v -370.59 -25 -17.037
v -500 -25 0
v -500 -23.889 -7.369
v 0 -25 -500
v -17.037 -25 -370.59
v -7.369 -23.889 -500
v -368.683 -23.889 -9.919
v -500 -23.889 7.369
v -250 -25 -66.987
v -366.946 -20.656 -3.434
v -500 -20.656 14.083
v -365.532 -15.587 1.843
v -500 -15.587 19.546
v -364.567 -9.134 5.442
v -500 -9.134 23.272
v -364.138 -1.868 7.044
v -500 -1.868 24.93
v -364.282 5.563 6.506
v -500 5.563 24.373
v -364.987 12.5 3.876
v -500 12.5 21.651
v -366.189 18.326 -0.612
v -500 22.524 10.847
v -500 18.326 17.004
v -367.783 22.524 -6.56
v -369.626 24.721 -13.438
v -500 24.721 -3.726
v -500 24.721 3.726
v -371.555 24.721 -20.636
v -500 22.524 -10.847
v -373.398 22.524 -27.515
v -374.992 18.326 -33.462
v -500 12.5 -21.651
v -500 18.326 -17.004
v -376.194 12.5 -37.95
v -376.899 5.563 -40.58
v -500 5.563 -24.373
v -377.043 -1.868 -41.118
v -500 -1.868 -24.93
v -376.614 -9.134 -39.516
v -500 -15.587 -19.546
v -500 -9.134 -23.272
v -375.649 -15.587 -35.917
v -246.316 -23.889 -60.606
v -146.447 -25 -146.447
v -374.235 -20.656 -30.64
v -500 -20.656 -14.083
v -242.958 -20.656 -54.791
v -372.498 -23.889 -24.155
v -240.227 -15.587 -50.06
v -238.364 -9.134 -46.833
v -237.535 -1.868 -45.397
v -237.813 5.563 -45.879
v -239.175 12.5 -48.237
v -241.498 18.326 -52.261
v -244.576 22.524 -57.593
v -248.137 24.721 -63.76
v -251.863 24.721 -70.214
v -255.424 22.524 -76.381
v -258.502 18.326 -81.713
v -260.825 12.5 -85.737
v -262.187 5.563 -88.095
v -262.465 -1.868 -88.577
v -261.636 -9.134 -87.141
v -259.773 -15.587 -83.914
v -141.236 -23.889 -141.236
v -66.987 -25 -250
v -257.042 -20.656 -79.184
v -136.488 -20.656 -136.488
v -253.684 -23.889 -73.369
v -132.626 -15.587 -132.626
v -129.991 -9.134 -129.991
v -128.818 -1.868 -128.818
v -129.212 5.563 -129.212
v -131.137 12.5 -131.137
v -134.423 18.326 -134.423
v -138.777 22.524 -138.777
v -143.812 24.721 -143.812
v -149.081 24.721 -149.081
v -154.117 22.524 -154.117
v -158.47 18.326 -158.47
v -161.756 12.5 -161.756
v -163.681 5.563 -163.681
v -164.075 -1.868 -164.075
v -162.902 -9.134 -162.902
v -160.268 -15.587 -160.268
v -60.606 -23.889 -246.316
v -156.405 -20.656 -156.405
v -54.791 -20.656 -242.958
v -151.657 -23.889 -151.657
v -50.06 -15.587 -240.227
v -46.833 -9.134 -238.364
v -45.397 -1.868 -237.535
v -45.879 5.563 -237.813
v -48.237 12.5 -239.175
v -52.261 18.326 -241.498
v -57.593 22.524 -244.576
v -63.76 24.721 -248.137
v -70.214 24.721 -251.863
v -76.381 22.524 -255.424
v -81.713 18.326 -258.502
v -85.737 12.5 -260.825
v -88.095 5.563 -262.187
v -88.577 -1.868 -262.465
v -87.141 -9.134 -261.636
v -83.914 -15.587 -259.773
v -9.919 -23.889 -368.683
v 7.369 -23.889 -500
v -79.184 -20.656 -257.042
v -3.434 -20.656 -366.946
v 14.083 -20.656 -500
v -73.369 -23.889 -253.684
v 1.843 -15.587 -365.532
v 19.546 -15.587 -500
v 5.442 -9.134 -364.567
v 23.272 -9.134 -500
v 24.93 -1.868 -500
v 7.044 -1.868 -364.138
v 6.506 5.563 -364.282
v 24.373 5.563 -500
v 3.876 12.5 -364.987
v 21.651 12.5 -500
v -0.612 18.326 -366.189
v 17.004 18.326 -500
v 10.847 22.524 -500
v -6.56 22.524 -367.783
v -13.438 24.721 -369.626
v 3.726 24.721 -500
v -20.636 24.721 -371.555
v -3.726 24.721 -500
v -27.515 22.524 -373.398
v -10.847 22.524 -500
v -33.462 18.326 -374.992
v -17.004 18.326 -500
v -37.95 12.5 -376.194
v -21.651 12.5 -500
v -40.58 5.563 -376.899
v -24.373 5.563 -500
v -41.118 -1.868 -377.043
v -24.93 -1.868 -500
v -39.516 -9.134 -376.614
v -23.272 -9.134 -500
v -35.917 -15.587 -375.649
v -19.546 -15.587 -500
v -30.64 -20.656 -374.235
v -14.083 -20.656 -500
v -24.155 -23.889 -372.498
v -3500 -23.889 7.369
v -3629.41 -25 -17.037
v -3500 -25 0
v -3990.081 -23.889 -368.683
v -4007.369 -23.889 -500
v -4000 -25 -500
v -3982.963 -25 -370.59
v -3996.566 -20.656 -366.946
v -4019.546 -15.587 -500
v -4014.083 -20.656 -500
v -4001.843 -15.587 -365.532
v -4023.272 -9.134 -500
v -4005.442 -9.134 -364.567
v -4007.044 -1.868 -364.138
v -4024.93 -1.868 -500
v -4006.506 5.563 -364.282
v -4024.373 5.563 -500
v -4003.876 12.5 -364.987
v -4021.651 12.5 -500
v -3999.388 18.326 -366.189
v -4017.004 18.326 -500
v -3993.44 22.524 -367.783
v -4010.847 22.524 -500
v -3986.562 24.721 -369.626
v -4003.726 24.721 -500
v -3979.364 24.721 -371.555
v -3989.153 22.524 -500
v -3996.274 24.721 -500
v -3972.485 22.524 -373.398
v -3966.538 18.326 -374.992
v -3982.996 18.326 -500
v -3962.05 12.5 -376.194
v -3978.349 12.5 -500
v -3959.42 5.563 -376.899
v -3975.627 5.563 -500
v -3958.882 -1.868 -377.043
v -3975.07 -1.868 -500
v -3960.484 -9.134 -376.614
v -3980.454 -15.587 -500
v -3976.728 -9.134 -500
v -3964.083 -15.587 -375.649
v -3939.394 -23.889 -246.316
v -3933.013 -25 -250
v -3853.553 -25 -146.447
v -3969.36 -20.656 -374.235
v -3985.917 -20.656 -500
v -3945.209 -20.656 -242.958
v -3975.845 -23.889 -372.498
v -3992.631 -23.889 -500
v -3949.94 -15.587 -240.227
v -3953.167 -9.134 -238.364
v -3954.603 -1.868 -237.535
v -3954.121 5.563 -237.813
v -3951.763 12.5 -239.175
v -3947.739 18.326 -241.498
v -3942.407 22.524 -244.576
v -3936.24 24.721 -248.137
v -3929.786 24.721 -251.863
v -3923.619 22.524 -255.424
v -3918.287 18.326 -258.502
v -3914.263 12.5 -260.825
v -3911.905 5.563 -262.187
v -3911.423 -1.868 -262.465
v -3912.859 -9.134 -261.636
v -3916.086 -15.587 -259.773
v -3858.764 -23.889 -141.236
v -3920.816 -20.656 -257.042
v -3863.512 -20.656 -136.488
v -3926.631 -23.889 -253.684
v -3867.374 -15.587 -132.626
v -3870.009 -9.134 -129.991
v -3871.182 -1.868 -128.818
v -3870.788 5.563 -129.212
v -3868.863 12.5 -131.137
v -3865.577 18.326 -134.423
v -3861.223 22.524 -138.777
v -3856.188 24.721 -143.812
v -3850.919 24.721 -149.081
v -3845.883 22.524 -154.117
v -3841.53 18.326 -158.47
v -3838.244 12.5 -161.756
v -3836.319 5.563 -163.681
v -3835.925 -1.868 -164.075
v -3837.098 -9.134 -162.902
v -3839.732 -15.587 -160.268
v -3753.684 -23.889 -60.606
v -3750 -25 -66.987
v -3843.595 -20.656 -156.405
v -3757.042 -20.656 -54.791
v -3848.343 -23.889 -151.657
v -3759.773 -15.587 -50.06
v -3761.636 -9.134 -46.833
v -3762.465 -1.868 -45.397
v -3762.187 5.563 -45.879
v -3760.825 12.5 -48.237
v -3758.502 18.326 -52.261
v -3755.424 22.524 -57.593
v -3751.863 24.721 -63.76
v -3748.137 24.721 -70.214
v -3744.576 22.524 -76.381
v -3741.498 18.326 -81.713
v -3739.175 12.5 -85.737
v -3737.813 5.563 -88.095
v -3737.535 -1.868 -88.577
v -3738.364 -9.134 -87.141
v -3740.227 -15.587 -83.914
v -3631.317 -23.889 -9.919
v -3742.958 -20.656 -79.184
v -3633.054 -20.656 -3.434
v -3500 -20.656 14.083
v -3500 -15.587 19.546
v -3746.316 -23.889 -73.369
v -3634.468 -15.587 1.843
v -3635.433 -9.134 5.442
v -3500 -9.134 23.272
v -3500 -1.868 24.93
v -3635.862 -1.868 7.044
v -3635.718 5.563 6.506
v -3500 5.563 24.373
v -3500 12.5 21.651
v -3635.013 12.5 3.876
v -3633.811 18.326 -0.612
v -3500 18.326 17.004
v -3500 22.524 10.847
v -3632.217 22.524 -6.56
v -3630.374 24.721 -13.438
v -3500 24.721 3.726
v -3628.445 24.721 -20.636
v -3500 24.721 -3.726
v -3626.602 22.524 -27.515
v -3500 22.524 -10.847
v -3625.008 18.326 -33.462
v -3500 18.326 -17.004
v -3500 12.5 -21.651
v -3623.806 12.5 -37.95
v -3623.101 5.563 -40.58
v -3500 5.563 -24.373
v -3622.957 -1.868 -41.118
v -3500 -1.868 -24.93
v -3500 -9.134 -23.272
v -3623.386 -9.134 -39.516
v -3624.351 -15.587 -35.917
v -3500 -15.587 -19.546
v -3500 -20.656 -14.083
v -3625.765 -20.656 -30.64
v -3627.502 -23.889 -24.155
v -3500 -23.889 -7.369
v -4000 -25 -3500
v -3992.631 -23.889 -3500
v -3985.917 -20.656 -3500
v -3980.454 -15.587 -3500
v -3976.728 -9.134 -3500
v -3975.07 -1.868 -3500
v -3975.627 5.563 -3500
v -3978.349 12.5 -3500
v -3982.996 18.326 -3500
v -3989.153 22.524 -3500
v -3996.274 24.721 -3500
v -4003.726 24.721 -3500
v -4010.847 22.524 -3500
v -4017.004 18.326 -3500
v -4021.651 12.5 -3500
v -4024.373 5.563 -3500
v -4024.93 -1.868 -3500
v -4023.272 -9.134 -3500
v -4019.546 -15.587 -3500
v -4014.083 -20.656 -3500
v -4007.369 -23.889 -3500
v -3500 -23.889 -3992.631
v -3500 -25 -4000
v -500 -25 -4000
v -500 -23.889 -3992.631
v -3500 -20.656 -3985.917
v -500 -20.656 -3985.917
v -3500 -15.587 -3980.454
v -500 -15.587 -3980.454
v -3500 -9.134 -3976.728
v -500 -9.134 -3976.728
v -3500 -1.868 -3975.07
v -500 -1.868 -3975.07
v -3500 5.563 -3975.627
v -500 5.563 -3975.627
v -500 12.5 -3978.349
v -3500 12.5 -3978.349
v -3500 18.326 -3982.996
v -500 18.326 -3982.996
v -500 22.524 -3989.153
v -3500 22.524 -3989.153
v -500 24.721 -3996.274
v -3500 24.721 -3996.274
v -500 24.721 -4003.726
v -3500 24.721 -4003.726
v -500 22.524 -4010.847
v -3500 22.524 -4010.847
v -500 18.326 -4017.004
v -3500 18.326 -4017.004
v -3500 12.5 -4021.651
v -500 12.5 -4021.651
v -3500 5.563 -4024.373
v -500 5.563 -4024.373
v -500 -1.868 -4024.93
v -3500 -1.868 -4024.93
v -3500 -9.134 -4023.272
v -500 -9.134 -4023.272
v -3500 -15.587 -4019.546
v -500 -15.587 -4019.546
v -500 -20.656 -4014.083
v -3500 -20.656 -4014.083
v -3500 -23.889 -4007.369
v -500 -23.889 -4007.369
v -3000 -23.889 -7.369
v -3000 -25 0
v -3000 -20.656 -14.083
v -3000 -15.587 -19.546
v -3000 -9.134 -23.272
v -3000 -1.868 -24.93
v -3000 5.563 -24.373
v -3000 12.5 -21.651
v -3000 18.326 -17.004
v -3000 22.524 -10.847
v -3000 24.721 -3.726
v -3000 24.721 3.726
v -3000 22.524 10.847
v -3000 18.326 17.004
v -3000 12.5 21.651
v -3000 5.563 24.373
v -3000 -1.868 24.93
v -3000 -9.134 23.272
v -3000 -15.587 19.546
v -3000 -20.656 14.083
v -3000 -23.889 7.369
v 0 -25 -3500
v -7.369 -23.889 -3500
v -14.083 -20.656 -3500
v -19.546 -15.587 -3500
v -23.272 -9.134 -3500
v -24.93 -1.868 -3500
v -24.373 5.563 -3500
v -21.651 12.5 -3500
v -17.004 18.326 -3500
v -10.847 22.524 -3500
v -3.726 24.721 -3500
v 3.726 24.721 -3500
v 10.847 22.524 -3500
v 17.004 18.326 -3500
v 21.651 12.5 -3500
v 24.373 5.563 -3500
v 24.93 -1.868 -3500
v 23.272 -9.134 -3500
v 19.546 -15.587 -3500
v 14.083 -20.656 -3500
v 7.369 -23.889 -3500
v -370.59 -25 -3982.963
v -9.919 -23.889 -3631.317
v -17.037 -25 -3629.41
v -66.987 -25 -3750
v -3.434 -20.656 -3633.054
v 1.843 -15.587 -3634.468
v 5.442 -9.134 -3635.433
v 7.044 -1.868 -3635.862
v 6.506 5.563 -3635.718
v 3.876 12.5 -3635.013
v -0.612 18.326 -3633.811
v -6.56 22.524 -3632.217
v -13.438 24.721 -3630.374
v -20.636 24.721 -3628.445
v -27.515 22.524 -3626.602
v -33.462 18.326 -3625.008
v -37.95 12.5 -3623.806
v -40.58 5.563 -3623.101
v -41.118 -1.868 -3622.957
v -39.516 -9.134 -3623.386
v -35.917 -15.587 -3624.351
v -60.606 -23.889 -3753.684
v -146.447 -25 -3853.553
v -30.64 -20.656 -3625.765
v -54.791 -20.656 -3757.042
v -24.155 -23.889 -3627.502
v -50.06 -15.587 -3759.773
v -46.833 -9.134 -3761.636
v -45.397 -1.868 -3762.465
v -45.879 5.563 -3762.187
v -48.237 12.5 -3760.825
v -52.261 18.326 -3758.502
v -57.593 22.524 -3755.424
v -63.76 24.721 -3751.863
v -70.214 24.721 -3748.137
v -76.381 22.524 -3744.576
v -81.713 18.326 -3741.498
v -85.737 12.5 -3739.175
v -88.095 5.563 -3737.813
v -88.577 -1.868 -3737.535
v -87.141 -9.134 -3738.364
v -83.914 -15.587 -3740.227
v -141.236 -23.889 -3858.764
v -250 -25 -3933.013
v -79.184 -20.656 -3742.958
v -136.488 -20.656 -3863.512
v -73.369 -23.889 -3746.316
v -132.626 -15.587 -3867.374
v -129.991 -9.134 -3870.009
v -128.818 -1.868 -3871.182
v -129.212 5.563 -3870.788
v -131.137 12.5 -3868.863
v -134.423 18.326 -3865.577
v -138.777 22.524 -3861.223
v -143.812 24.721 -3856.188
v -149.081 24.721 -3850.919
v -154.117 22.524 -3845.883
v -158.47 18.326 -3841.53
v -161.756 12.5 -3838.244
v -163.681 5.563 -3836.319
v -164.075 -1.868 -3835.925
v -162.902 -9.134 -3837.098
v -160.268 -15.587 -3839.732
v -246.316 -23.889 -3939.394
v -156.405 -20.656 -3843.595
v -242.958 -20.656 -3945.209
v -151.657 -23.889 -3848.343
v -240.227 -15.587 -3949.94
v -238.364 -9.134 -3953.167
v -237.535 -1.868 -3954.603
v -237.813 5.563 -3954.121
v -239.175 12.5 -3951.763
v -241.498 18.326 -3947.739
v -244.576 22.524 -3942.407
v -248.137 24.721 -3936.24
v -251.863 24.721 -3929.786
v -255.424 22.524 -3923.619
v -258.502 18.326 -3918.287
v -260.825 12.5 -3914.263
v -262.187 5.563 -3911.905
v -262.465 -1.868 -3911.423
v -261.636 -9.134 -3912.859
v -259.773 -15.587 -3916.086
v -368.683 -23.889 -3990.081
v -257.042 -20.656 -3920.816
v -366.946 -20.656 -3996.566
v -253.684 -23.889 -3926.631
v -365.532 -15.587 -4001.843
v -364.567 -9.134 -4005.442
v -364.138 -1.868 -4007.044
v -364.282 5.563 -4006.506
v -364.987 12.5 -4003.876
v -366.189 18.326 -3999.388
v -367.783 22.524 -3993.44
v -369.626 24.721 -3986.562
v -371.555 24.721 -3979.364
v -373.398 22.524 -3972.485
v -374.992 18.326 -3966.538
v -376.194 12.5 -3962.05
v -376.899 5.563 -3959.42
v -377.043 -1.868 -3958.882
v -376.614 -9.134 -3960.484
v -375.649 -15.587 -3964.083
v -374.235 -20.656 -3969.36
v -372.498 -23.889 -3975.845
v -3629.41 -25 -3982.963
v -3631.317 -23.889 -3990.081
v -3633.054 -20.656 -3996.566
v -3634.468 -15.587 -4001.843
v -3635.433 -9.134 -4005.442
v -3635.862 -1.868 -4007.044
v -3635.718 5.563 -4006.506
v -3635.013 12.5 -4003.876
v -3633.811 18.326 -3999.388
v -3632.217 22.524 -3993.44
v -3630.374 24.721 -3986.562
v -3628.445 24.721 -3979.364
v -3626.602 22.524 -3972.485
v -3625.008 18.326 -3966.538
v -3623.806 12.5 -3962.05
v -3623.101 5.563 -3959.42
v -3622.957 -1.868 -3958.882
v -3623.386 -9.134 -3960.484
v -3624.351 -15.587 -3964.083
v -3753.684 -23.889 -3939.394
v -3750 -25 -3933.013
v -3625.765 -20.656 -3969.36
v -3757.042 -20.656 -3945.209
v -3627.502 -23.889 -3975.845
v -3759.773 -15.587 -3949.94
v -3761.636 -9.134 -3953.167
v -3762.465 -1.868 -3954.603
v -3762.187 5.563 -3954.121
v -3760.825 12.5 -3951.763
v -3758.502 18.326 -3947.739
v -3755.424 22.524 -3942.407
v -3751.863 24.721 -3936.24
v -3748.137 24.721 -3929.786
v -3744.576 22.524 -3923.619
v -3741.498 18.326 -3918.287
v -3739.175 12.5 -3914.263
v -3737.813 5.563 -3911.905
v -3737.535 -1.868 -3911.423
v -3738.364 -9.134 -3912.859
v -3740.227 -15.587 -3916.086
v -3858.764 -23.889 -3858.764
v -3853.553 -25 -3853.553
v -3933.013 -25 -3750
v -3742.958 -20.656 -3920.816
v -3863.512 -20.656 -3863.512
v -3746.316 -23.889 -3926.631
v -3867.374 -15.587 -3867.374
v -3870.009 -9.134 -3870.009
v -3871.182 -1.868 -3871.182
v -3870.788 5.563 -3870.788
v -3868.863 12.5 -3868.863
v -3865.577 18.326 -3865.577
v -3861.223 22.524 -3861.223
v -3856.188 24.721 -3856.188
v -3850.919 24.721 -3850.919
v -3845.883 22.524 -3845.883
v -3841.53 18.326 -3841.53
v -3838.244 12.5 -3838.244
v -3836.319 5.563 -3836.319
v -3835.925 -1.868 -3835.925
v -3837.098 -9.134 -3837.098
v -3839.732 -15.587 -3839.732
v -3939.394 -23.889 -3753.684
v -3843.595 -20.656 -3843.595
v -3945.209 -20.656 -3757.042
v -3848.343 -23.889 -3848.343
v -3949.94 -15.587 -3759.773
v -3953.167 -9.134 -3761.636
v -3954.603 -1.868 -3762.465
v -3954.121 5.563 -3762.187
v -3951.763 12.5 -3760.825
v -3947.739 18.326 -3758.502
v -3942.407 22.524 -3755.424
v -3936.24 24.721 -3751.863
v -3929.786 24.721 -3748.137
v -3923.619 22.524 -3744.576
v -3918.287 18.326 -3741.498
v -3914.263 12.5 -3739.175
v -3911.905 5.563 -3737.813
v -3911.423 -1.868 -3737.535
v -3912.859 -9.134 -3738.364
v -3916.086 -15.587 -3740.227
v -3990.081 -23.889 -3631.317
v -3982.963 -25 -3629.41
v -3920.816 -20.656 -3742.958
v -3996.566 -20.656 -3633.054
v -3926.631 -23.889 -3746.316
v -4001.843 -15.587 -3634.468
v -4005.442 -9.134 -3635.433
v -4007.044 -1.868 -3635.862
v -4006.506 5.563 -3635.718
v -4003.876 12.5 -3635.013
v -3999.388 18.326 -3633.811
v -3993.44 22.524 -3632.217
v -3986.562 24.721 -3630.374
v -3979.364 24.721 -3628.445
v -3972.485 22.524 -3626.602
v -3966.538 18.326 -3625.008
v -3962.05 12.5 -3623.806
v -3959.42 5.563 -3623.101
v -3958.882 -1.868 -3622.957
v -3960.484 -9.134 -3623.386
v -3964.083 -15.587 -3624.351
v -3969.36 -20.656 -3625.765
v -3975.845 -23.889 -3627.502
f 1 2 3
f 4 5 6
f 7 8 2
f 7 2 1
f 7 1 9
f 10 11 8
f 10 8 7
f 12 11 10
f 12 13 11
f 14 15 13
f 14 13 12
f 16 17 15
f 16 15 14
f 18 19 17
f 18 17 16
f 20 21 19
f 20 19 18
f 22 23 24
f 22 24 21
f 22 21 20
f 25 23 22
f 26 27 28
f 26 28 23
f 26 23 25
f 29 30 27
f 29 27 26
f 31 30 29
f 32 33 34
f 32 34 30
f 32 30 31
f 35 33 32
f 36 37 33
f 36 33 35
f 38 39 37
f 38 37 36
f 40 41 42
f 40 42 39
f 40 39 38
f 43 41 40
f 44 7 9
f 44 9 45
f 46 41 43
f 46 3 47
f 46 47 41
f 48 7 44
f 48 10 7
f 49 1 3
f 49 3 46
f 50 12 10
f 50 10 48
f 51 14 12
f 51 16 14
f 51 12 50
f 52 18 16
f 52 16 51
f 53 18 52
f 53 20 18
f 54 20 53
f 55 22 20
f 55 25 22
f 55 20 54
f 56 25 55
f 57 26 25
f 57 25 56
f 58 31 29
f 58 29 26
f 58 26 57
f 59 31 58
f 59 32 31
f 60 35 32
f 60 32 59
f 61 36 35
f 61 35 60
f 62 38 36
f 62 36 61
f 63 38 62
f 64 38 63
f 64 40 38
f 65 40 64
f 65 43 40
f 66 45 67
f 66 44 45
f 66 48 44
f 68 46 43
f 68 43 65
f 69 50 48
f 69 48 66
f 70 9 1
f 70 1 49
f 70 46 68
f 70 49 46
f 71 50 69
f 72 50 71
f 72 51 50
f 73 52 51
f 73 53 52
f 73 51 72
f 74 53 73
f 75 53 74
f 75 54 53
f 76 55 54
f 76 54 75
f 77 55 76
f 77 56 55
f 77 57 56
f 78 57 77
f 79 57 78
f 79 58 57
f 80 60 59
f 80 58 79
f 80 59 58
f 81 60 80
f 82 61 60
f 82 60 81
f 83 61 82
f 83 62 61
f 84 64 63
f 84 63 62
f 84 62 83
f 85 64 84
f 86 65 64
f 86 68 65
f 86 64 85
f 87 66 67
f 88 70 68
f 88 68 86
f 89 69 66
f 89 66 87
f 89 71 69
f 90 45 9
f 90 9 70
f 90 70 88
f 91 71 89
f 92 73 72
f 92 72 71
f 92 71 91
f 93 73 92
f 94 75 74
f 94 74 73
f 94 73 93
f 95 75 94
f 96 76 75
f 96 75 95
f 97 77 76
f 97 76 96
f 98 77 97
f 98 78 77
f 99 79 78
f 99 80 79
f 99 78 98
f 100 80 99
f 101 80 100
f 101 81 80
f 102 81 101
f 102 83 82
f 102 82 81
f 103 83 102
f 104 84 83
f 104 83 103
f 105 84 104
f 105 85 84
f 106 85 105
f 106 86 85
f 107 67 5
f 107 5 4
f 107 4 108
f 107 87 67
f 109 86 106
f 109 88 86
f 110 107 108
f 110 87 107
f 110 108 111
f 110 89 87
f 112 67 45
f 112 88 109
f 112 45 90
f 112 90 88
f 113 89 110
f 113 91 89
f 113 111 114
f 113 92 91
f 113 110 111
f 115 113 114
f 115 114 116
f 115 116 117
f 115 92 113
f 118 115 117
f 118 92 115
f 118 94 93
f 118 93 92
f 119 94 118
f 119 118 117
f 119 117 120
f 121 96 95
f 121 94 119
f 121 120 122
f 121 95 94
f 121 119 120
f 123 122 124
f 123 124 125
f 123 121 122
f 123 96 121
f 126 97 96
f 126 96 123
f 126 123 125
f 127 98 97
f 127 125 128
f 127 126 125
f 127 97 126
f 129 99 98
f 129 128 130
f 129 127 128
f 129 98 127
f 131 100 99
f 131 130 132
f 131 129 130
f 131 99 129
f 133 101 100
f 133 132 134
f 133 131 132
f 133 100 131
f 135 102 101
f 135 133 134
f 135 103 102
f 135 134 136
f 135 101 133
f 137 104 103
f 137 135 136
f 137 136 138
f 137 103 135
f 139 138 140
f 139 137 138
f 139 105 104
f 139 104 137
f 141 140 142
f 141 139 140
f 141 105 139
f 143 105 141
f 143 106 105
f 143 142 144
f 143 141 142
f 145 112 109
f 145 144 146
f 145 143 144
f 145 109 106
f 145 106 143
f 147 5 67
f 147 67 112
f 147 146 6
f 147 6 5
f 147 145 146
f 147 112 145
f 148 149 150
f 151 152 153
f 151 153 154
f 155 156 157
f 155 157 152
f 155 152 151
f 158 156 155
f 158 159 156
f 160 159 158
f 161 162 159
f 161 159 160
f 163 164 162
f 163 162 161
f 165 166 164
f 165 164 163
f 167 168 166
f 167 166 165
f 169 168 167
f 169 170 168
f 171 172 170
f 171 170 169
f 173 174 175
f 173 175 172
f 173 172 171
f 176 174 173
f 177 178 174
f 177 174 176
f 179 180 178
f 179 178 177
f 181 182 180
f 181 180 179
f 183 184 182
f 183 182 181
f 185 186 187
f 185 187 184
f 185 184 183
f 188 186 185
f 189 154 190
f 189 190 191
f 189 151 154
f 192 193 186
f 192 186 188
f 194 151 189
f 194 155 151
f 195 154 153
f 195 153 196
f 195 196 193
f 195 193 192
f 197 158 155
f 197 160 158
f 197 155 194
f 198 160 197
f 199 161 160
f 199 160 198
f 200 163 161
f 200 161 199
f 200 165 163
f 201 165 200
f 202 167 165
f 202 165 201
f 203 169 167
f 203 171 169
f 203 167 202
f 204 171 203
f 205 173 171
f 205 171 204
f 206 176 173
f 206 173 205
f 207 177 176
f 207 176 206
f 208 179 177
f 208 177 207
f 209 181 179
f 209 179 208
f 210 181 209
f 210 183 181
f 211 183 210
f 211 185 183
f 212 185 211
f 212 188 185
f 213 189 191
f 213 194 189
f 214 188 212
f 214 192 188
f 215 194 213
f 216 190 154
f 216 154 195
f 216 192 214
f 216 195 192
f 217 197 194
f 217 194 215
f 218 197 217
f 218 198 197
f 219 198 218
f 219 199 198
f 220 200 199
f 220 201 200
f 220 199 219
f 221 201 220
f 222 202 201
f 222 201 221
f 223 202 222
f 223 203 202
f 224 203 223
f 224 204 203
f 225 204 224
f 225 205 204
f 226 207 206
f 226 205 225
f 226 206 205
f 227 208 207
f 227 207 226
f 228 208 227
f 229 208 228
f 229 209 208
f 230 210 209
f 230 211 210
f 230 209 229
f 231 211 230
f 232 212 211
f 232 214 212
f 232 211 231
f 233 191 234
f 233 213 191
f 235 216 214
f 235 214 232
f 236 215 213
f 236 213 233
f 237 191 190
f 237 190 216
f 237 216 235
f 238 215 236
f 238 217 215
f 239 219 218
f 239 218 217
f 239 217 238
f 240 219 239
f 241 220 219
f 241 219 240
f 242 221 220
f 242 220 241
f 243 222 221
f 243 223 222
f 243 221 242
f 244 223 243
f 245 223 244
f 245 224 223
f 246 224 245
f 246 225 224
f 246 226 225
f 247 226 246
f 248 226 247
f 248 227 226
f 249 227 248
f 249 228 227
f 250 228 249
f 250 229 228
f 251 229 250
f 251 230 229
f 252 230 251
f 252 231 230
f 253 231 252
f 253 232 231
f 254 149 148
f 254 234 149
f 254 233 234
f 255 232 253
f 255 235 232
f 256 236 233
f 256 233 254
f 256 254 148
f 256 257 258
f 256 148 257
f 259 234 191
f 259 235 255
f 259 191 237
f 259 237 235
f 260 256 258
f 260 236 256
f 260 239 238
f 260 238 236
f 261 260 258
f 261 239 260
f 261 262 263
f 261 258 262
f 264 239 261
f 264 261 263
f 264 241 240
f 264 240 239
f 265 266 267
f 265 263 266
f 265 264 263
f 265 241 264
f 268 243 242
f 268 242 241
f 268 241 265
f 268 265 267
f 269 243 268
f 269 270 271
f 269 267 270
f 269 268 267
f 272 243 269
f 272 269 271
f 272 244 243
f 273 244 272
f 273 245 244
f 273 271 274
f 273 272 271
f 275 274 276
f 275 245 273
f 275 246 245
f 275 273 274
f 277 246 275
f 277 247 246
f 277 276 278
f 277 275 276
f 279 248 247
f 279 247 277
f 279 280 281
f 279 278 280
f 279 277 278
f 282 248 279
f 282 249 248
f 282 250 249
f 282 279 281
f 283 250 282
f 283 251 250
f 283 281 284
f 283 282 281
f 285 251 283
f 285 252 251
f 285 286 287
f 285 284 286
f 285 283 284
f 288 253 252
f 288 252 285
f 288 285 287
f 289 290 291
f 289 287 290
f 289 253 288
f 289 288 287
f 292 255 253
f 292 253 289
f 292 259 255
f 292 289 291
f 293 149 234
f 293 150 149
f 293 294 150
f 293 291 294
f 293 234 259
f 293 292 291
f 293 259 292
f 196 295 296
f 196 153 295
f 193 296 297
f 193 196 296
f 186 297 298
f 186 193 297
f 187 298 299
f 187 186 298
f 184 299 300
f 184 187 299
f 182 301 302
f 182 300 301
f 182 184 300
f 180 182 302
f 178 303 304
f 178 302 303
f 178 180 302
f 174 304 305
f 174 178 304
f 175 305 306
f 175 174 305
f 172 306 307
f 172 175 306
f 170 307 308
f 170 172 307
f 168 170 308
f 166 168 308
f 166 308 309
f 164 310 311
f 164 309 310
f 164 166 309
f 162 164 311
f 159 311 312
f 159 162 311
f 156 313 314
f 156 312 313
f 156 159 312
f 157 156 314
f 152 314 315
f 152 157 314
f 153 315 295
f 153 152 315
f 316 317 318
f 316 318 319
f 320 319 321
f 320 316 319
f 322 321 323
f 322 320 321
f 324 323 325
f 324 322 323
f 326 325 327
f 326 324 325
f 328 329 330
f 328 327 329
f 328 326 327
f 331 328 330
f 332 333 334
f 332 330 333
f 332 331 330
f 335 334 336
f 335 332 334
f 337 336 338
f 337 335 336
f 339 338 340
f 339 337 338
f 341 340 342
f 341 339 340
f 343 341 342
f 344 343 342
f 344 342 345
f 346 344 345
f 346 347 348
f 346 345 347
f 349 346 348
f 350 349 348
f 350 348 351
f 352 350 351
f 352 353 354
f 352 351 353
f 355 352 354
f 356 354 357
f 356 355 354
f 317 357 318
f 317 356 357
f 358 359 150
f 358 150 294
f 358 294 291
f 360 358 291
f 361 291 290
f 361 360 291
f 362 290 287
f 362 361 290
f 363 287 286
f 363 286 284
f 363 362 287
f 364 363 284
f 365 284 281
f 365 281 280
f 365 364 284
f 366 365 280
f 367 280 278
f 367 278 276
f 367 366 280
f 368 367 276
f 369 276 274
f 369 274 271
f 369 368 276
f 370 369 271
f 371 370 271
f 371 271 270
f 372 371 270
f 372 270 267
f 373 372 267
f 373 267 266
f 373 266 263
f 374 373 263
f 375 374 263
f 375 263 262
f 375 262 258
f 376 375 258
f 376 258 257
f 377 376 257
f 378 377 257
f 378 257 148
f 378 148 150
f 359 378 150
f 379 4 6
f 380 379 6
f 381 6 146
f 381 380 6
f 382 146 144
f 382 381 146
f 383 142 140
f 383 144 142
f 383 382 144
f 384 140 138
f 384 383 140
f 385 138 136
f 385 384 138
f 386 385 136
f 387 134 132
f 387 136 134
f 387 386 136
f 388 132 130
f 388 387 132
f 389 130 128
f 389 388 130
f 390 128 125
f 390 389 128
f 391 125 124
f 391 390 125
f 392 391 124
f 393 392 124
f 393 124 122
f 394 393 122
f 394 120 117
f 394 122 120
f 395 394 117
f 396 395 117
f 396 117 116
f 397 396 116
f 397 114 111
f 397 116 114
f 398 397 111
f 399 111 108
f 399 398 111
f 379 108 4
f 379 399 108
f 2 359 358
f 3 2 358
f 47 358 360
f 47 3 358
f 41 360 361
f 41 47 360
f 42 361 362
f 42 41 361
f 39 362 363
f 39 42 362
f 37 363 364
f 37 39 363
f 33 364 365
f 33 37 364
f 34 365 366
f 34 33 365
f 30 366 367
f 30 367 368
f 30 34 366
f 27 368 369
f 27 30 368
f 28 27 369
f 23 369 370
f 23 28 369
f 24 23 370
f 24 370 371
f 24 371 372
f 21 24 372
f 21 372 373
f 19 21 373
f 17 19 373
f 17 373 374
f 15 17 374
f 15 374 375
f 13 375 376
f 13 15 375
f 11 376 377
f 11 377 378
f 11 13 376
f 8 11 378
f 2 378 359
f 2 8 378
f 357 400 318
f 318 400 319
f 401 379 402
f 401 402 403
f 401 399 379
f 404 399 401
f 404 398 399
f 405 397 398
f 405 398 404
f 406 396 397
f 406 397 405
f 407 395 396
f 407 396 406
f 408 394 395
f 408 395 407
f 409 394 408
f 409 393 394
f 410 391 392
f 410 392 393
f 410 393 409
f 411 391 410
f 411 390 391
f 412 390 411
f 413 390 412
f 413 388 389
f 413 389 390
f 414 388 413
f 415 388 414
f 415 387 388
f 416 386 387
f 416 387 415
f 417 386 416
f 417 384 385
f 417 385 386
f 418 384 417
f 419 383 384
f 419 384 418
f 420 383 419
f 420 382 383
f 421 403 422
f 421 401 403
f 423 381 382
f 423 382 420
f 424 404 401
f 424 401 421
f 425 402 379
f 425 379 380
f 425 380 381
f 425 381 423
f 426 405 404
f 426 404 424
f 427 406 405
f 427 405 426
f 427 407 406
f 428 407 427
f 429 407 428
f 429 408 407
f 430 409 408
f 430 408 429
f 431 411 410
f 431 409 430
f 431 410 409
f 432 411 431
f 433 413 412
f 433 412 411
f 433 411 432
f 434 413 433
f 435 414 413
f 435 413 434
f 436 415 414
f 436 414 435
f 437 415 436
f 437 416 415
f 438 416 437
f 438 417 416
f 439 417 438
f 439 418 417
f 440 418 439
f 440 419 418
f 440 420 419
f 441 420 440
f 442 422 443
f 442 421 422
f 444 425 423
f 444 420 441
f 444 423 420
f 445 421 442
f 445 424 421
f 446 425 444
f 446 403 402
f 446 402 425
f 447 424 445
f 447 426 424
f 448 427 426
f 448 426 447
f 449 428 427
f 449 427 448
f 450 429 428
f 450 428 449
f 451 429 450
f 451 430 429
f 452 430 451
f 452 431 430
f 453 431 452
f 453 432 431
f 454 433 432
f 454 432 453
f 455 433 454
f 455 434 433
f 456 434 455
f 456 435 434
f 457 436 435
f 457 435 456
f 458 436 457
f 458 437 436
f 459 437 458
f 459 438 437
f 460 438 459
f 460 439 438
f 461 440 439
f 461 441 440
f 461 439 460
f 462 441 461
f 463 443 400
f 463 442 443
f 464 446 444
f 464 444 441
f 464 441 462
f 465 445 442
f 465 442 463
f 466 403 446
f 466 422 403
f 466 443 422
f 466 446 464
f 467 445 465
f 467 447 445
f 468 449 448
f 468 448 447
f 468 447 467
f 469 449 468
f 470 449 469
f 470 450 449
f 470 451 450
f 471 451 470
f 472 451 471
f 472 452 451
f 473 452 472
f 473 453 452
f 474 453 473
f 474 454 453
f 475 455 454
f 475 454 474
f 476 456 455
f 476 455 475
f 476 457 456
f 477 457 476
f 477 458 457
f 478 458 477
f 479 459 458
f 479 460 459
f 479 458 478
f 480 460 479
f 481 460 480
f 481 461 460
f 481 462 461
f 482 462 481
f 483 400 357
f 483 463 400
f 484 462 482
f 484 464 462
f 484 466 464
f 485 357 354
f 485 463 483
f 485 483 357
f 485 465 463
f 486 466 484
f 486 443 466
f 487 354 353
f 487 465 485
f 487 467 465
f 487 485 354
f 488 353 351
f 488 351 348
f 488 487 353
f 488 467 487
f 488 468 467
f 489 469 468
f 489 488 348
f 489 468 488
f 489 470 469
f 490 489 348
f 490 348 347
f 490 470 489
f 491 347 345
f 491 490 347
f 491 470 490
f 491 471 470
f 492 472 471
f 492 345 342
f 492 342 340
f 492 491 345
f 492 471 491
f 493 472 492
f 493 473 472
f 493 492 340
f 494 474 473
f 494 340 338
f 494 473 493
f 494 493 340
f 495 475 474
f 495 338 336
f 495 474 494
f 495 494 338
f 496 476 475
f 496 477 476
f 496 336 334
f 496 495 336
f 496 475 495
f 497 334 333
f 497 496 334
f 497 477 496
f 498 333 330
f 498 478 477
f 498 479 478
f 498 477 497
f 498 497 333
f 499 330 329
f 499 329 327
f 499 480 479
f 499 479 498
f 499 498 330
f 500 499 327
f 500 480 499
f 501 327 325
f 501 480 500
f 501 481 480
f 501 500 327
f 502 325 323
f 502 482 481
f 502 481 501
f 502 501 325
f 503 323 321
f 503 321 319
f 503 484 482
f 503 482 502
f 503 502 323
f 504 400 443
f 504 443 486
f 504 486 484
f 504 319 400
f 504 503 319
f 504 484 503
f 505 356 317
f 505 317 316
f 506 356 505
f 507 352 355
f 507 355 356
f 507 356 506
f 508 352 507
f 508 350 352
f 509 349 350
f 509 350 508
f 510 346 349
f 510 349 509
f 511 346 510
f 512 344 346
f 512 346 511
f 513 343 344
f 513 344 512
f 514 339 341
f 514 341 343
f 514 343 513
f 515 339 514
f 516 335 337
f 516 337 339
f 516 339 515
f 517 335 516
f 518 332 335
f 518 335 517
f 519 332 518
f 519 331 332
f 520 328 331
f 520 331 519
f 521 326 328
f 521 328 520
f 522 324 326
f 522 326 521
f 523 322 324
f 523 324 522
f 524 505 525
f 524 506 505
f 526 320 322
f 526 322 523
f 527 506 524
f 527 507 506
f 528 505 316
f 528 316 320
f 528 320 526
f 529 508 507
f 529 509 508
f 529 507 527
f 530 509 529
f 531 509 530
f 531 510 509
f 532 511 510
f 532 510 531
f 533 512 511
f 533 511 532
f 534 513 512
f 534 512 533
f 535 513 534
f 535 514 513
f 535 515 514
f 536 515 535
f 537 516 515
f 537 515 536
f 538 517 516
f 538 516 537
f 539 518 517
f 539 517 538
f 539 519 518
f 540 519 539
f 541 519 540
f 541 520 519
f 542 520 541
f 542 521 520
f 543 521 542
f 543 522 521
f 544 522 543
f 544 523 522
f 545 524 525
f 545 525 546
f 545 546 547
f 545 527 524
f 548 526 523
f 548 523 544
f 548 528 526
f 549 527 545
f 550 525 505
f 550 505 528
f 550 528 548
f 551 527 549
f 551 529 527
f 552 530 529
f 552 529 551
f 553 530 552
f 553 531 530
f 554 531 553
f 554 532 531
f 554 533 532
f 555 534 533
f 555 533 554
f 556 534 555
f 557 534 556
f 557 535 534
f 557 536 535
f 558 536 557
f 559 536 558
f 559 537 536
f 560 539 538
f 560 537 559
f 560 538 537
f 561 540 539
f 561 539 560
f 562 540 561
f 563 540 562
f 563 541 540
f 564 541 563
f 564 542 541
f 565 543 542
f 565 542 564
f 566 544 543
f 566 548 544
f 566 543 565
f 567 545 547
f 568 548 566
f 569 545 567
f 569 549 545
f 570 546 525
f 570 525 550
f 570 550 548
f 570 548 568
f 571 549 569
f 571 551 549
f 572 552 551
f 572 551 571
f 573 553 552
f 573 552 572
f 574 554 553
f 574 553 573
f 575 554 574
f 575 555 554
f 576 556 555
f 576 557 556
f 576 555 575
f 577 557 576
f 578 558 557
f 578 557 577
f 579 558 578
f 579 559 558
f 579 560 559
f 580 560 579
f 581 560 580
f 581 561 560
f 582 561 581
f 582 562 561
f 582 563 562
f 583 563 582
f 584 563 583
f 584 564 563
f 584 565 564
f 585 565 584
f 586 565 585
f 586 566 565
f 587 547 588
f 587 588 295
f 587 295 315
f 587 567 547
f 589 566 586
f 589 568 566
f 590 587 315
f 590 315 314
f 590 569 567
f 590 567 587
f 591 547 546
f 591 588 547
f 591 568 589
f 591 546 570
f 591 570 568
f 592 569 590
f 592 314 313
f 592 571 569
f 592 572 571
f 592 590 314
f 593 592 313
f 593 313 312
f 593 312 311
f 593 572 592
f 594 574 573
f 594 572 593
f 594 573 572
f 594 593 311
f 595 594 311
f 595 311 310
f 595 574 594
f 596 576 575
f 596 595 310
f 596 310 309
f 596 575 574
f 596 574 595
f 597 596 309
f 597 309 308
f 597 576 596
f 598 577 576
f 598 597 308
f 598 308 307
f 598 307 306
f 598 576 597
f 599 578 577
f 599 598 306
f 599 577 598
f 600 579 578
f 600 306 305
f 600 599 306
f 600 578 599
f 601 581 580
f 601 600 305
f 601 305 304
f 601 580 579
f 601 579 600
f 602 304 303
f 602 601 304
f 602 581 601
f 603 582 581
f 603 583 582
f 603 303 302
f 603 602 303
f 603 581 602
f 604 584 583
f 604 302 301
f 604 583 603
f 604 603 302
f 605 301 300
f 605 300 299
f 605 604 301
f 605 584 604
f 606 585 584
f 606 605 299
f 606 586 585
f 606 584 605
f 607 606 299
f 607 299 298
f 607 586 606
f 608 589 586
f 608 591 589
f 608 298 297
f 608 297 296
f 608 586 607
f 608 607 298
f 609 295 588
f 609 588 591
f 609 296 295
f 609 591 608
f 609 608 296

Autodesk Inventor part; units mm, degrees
ref_plane "YZ Plane" through (0, 0, 0) normal (1, 0, 0) x (0, 1, 0)
ref_plane "XZ Plane" through (0, 0, 0) normal (0, 1, 0) x (-1, 0, 0)
ref_plane "XY Plane" through (0, 0, 0) normal (0, 0, 1) x (1, 0, 0)
sketch "Boceto1" plane through (0, 0, 0) normal (0, 1, 0) x (-1, 0, 0)
  point P0 (0, 0)
ref_plane "Plano de trabajo1" through (-3000, 0, 0) normal (-1, 0, 0) x (0, -1, 0)
sketch "Boceto2" plane through (-3000, 0, 0) normal (-1, 0, 0) x (0, -1, 0)
  circle A0 centre (0, 0) radius 25
  dimension "d11" = 50
sketch3d "Boceto 3D1"
  line L0 (-3000, 0, 0) -> (-500, 0, 0)
  arc A0 (-500, 0, 0) -> (0, 0, -500) centre (-500, 0, -500) ccw
  line L1 (0, 0, -500) -> (0, 0, -3500)
  arc A1 (0, 0, -3500) -> (-500, 0, -4000) centre (-500, 0, -3500) ccw
  line L2 (-500, 0, -4000) -> (-3500, 0, -4000)
  arc A2 (-3500, 0, -4000) -> (-4000, 0, -3500) centre (-3500, 0, -3500) ccw
  line L3 (-4000, 0, -3500) -> (-4000, 0, -500)
  arc A3 (-4000, 0, -500) -> (-3500, 0, 0) centre (-3500, 0, -500) ccw
  line L4 (-3500, 0, 0) -> (-3000, 0, 0)
  dimension "d0" = 4000
  dimension "d1" = 4000
  dimension "d2" = 4000
  dimension "d5" = 500
  dimension "d6" = 500
  dimension "d7" = 3000
  dimension "d8" = 995
  dimension "d9" = 500
  dimension "d10" = 500
sweep "Barrido1" add profiles "Boceto2" path "Boceto 3D1"
equation "\"d5\" = d3"
equation "\"d6\" = d3"
equation "\"d10\" = d9"
equation "\"d3\" = 500"
properties part number "Riel"
